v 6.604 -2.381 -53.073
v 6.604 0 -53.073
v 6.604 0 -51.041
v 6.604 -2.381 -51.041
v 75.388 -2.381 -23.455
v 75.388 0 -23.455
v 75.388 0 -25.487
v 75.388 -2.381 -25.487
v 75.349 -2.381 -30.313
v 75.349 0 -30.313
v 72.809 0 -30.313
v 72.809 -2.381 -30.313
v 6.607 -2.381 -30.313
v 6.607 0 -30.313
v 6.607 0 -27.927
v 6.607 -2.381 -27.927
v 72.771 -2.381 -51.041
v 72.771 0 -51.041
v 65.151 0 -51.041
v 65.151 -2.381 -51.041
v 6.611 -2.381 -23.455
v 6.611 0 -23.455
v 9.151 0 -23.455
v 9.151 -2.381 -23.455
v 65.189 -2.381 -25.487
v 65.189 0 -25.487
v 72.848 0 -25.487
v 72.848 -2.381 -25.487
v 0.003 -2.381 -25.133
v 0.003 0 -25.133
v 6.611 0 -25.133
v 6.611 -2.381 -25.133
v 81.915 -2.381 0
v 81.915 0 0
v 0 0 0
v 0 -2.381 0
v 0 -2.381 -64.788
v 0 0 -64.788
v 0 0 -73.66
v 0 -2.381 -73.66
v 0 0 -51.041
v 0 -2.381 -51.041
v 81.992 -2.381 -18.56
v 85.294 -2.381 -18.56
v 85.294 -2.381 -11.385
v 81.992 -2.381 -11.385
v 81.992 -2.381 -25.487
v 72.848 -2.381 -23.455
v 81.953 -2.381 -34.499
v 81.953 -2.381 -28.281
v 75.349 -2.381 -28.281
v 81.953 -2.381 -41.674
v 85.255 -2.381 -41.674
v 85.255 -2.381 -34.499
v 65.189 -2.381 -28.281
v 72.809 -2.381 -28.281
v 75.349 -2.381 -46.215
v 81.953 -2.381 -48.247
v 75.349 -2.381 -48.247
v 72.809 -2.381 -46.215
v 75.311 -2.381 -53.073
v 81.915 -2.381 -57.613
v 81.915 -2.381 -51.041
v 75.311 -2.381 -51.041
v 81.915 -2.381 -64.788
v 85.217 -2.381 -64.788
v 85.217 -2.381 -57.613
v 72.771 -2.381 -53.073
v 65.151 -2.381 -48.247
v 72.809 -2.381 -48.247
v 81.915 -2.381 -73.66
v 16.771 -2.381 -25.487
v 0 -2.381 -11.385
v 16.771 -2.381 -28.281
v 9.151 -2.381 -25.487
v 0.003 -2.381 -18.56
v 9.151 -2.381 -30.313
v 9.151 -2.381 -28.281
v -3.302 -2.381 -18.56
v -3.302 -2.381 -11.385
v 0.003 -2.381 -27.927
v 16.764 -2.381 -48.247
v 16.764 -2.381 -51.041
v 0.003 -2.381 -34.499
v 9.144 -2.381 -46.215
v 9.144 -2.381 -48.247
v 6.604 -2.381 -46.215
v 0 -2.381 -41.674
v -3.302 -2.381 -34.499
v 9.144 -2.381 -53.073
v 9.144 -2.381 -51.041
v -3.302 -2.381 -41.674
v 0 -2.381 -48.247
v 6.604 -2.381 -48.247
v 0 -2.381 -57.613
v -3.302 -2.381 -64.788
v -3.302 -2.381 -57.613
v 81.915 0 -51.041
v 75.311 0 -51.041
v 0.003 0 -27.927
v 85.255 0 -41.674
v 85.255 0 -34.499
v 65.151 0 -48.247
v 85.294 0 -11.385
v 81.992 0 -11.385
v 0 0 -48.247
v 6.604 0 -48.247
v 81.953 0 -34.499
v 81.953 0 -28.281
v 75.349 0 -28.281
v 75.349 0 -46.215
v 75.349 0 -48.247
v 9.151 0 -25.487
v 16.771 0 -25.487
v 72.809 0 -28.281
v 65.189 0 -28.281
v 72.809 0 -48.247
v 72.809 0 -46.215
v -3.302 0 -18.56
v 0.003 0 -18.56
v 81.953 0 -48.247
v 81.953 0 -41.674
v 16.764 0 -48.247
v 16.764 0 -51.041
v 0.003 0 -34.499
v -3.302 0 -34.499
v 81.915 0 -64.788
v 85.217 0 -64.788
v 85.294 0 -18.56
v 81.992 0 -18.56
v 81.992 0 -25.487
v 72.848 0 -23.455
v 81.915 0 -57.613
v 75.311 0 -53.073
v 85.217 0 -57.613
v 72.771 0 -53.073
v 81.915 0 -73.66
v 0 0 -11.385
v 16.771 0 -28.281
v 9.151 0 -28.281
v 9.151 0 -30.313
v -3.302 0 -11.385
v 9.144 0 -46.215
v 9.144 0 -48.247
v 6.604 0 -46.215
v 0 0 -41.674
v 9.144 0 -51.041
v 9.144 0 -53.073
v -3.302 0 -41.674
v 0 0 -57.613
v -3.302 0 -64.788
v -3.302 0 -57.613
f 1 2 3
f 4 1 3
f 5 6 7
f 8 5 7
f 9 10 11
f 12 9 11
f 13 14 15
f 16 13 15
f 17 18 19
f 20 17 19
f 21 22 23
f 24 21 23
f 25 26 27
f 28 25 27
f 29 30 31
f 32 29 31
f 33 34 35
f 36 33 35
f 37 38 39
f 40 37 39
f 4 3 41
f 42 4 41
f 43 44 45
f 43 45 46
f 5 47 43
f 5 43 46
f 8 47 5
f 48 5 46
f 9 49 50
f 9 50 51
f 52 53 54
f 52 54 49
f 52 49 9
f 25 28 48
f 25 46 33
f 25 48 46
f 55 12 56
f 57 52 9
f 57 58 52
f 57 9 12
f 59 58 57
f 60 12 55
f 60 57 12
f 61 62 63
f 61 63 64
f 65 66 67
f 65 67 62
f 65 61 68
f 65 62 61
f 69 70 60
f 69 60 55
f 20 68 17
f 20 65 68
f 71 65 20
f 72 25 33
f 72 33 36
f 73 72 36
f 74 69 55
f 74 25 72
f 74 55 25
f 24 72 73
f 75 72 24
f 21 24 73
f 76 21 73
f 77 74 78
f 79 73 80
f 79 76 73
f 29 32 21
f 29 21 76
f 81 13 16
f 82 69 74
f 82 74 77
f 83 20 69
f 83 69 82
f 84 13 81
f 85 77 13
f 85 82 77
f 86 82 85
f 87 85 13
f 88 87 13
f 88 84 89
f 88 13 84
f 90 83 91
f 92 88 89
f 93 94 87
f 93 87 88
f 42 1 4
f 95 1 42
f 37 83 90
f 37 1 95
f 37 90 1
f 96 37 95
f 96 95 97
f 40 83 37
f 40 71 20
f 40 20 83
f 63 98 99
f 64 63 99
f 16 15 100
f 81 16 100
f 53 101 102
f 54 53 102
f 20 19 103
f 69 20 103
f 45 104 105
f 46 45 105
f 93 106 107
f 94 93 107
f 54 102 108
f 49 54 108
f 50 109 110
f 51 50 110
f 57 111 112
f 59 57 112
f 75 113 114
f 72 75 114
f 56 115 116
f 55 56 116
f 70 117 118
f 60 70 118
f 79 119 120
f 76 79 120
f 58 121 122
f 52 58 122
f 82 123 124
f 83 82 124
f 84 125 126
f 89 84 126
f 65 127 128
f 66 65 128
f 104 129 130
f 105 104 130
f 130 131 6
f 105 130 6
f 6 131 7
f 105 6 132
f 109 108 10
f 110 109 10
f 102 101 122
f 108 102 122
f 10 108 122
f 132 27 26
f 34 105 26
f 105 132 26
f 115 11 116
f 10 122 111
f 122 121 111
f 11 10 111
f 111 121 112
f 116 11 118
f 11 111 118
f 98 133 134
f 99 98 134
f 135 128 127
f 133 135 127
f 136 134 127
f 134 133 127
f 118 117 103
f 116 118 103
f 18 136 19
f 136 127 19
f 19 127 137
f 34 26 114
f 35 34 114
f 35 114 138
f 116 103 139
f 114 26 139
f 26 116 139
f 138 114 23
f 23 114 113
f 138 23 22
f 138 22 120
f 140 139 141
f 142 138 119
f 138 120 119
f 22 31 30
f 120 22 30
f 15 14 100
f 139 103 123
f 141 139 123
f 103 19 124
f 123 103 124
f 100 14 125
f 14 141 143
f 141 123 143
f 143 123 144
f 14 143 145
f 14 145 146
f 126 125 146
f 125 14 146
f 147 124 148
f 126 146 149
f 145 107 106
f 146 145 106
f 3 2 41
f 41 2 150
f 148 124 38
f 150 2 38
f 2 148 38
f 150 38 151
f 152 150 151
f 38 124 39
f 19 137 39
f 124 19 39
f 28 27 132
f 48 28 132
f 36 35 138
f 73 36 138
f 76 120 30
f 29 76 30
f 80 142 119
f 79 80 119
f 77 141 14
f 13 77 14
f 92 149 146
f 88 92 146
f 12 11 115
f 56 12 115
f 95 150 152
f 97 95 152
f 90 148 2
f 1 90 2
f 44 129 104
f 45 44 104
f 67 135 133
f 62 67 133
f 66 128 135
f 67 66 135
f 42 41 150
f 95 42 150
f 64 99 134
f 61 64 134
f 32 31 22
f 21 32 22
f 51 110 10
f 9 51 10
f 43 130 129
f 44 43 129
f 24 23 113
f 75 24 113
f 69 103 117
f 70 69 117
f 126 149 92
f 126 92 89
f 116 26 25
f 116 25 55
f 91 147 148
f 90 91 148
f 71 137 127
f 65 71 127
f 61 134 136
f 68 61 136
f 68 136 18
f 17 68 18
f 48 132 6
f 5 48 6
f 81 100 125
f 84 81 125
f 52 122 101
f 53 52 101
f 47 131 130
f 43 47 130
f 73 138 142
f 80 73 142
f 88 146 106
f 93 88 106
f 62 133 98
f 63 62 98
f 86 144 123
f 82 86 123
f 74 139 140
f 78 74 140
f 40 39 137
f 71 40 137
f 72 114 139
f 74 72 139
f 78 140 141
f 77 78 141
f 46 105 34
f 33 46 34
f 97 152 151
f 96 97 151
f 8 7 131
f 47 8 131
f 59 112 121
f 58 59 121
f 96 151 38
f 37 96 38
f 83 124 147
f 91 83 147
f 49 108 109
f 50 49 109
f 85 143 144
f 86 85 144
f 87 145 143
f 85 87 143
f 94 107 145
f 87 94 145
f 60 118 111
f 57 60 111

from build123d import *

# Parameters (mm, degrees)
BOSS_EXTRUDE2_DEPTH = 2.38125


with BuildPart() as part:
    # Sketch1 → Boss-Extrude2 (new body)
    with BuildSketch(Plane(origin=(0, 0, 0), x_dir=(1, 0, 0), z_dir=(0, 1, 0))):
        Polygon((0, 73.66), (81.915, 73.66), (81.915, 64.788475447), (85.217, 64.788475447), (85.217, 57.612975447), (81.915, 57.612975447), (81.915, 51.040725447), (75.311, 51.040725447), (75.311, 53.072725447), (72.771, 53.072725447), (72.771, 51.040725447), (65.151, 51.040725447), (65.151, 48.246725447), (72.809250882, 48.246725447), (72.809250882, 46.214725447), (75.349250882, 46.214725447), (75.349250882, 48.246725447), (81.953250882, 48.246725447), (81.953250882, 41.674475447), (85.255250882, 41.674475447), (85.255250882, 34.498975447), (81.953250882, 34.498975447), (81.953250882, 28.281019423), (75.349250882, 28.281019423), (75.349250882, 30.313019423), (72.809250882, 30.313019423), (72.809250882, 28.281019423), (65.189250882, 28.281019423), (65.189250882, 26.884019423), (65.189250882, 25.487019423), (72.847501763, 25.487019423), (72.847501763, 23.455019423), (75.387501763, 23.455019423), (75.387501763, 25.487019423), (81.991501763, 25.487019423), (81.991501763, 18.560475447), (85.293501763, 18.560475447), (85.293501763, 11.384975447), (81.991501763, 11.384975447), (81.915, 0), (0, 0), (0, 11.384975447), (-3.302, 11.384975447), (-3.302, 18.560475447), (0.003462387, 18.560475447), (0.003462387, 25.132725447), (6.610924774, 25.132725447), (6.610924774, 23.455019423), (9.150924774, 23.455019423), (9.150924774, 25.487019423), (16.770924774, 25.487019423), (16.770924774, 28.281019423), (9.150924774, 28.281019423), (9.150924774, 30.313019423), (6.607462387, 30.313019423), (6.607462387, 27.926725447), (0.003462387, 27.926725447), (0.003462387, 34.498975447), (-3.302, 34.498975447), (-3.302, 38.016561862), (-3.302, 41.674475447), (0, 41.674475447), (0, 48.246725447), (6.604, 48.246725447), (6.604, 46.214725447), (9.144, 46.214725447), (9.144, 48.246725447), (16.764, 48.246725447), (16.764, 51.040725447), (9.144, 51.040725447), (9.144, 53.072725447), (6.604, 53.072725447), (6.604, 51.040725447), (0, 51.040725447), (0, 57.612975447), (-3.302, 57.612975447), (-3.302, 64.788475447), (0, 64.788475447), align=None)
    extrude(amount=-BOSS_EXTRUDE2_DEPTH)


solid = part.part
